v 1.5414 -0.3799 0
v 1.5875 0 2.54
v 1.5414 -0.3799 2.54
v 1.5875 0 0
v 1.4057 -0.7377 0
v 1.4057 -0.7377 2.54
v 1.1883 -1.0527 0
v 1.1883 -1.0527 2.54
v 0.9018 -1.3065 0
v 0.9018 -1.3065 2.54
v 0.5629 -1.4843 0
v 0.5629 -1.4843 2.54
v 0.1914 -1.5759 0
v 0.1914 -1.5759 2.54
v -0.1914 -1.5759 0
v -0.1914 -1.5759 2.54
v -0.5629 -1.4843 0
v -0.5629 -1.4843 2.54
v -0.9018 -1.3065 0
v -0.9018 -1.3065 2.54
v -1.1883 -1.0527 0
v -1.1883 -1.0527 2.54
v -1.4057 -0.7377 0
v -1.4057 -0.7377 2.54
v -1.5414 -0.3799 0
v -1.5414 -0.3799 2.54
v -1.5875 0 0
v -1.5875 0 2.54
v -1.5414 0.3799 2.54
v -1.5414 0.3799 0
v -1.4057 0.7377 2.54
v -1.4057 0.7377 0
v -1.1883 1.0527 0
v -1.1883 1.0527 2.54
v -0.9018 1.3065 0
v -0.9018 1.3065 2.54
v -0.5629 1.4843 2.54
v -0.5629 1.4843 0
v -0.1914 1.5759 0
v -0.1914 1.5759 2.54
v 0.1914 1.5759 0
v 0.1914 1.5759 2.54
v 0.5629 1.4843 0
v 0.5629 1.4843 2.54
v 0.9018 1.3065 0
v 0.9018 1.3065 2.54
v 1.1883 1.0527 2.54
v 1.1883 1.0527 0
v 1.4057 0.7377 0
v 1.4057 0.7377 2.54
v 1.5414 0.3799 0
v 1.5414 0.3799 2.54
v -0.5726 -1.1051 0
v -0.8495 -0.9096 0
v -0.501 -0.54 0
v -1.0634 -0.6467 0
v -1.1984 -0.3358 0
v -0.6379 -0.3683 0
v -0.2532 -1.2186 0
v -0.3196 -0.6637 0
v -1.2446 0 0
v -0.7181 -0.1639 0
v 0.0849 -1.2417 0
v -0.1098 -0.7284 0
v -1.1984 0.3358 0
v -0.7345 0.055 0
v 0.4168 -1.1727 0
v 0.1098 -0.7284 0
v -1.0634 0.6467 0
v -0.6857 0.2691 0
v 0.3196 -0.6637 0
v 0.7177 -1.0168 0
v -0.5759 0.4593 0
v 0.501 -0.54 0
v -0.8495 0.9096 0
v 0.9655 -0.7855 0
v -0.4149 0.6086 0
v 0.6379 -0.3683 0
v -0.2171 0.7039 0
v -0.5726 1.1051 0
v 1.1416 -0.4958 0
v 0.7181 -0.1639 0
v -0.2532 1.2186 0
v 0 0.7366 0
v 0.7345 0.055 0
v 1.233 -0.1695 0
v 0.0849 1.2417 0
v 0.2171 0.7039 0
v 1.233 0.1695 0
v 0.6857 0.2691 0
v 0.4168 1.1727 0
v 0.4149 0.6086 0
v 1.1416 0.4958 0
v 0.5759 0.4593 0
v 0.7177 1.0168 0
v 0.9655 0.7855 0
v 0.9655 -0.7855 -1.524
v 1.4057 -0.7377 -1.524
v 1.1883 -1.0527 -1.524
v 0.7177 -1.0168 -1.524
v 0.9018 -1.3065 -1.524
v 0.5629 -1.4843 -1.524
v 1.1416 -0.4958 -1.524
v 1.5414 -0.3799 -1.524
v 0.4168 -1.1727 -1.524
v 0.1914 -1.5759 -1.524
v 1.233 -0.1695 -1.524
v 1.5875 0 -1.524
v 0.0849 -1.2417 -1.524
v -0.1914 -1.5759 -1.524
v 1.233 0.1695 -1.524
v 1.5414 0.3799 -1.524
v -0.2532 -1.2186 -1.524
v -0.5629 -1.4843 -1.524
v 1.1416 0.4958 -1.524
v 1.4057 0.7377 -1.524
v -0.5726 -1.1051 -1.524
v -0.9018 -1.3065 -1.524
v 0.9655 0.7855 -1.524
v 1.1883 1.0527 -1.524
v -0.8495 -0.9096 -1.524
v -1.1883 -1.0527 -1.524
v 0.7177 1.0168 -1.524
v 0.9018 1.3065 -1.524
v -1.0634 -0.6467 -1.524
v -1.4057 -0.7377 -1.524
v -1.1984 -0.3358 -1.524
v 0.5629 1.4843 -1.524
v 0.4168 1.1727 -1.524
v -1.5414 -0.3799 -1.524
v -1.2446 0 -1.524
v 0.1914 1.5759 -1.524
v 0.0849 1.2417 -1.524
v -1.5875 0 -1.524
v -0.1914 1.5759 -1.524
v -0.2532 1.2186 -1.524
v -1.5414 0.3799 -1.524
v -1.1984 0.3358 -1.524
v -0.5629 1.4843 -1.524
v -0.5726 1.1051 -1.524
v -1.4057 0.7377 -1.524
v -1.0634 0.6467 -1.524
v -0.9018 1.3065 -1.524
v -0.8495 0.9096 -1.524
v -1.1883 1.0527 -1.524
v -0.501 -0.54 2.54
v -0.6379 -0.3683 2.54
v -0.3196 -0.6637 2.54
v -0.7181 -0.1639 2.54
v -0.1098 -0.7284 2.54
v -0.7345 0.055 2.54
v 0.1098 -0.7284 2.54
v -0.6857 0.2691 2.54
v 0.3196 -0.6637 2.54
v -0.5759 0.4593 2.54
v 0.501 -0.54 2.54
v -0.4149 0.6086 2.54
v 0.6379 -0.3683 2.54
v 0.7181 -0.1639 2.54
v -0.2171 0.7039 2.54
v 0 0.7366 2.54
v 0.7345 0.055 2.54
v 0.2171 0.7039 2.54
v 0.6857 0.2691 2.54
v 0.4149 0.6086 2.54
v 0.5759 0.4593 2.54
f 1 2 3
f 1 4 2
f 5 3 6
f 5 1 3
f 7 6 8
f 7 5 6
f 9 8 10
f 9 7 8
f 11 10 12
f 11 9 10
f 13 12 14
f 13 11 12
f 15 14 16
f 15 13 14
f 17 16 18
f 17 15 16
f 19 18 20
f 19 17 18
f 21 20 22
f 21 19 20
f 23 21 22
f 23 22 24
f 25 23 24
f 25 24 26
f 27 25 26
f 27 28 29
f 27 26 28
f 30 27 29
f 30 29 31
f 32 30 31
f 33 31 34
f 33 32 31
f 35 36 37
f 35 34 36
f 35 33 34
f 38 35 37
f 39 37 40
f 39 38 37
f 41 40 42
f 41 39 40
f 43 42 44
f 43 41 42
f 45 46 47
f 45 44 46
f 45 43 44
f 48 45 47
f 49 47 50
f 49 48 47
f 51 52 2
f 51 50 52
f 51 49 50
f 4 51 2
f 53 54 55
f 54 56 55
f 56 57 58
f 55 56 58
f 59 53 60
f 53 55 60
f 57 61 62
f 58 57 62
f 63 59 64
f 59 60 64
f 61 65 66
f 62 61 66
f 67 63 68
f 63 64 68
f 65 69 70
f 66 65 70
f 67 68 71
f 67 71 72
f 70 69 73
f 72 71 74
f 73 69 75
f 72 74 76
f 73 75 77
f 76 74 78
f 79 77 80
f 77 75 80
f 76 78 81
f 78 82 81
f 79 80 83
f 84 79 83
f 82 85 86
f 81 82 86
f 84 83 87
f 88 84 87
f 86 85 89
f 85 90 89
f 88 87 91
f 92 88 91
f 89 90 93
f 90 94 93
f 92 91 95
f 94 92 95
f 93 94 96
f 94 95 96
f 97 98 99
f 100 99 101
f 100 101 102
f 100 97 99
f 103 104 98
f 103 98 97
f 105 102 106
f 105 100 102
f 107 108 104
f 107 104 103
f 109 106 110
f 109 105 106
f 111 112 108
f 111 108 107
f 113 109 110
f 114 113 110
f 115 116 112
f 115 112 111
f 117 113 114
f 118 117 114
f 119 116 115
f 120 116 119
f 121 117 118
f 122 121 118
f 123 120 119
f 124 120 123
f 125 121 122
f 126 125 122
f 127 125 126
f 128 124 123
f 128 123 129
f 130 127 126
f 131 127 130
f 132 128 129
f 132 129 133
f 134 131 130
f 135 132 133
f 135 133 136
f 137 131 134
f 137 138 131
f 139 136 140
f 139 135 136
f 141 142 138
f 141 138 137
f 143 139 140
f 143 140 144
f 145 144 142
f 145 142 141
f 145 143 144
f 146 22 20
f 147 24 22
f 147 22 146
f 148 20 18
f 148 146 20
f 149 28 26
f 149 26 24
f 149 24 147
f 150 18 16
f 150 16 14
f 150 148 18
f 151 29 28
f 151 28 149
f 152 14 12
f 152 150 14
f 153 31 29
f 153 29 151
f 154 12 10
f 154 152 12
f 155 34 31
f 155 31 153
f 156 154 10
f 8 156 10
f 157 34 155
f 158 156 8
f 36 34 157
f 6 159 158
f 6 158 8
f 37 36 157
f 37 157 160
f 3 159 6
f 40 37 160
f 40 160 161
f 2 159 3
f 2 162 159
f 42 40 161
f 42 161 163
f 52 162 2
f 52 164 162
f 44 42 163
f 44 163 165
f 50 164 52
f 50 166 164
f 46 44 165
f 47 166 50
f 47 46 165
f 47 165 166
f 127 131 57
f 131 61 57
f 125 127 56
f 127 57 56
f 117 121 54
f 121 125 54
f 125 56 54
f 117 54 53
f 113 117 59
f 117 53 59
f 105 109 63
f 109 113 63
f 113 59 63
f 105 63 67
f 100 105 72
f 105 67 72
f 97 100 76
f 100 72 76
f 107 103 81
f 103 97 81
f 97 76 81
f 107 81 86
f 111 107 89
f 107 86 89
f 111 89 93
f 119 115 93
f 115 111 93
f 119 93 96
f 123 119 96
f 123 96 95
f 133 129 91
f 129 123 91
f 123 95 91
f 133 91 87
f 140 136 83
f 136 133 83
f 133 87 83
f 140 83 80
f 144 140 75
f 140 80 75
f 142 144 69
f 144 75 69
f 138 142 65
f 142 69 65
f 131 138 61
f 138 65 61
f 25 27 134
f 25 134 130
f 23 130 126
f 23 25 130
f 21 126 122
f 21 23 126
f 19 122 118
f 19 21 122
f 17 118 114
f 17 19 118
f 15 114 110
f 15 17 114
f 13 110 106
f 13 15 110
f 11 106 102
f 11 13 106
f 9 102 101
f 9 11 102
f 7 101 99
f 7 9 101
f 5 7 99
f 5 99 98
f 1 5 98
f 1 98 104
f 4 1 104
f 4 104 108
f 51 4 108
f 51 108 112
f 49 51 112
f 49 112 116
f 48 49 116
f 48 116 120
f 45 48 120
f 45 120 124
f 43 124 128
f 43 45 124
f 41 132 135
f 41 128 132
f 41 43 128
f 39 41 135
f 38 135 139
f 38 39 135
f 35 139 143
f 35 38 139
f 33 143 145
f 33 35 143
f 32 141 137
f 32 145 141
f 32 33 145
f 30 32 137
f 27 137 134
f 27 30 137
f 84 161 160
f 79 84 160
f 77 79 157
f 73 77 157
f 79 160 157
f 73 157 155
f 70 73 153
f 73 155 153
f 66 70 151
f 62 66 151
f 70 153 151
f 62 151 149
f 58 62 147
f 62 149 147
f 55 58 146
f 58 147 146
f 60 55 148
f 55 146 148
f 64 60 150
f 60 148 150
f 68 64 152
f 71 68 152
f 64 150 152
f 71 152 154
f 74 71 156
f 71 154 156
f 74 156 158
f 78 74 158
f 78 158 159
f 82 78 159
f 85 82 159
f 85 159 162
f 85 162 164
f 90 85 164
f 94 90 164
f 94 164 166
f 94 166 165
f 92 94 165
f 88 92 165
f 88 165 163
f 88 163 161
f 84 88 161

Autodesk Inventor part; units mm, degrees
ref_plane "YZ Plane" through (0, 0, 0) normal (1, 0, 0) x (0, 1, 0)
ref_plane "XZ Plane" through (0, 0, 0) normal (0, 1, 0) x (-1, 0, 0)
ref_plane "XY Plane" through (0, 0, 0) normal (0, 0, 1) x (1, 0, 0)
sketch "Sketch1" plane through (0, 0, 0) normal (0, 0, 1) x (1, 0, 0)
  circle A0 centre (0, 0) radius 1.5875
  dimension "d0" = 3.175
extrude "Extrusion1" add sketch "Sketch1" along normal blind 2.54
hole "Hole1" at (0, 0, 0) direction (0, 0, 1) diameter 1.4732 end through all
sketch "Sketch2" plane through (0, 0, 0) normal (0, 0, -1) x (-1, 0, 0)
  circle A0 centre (0, 0) radius 1.5875 projected
  circle A1 centre (0, 0) radius 1.2446
  dimension "d12" = 2.4892
extrude "Extrusion2" add sketch "Sketch2" along normal blind 1.524
properties part number "inner_block"
